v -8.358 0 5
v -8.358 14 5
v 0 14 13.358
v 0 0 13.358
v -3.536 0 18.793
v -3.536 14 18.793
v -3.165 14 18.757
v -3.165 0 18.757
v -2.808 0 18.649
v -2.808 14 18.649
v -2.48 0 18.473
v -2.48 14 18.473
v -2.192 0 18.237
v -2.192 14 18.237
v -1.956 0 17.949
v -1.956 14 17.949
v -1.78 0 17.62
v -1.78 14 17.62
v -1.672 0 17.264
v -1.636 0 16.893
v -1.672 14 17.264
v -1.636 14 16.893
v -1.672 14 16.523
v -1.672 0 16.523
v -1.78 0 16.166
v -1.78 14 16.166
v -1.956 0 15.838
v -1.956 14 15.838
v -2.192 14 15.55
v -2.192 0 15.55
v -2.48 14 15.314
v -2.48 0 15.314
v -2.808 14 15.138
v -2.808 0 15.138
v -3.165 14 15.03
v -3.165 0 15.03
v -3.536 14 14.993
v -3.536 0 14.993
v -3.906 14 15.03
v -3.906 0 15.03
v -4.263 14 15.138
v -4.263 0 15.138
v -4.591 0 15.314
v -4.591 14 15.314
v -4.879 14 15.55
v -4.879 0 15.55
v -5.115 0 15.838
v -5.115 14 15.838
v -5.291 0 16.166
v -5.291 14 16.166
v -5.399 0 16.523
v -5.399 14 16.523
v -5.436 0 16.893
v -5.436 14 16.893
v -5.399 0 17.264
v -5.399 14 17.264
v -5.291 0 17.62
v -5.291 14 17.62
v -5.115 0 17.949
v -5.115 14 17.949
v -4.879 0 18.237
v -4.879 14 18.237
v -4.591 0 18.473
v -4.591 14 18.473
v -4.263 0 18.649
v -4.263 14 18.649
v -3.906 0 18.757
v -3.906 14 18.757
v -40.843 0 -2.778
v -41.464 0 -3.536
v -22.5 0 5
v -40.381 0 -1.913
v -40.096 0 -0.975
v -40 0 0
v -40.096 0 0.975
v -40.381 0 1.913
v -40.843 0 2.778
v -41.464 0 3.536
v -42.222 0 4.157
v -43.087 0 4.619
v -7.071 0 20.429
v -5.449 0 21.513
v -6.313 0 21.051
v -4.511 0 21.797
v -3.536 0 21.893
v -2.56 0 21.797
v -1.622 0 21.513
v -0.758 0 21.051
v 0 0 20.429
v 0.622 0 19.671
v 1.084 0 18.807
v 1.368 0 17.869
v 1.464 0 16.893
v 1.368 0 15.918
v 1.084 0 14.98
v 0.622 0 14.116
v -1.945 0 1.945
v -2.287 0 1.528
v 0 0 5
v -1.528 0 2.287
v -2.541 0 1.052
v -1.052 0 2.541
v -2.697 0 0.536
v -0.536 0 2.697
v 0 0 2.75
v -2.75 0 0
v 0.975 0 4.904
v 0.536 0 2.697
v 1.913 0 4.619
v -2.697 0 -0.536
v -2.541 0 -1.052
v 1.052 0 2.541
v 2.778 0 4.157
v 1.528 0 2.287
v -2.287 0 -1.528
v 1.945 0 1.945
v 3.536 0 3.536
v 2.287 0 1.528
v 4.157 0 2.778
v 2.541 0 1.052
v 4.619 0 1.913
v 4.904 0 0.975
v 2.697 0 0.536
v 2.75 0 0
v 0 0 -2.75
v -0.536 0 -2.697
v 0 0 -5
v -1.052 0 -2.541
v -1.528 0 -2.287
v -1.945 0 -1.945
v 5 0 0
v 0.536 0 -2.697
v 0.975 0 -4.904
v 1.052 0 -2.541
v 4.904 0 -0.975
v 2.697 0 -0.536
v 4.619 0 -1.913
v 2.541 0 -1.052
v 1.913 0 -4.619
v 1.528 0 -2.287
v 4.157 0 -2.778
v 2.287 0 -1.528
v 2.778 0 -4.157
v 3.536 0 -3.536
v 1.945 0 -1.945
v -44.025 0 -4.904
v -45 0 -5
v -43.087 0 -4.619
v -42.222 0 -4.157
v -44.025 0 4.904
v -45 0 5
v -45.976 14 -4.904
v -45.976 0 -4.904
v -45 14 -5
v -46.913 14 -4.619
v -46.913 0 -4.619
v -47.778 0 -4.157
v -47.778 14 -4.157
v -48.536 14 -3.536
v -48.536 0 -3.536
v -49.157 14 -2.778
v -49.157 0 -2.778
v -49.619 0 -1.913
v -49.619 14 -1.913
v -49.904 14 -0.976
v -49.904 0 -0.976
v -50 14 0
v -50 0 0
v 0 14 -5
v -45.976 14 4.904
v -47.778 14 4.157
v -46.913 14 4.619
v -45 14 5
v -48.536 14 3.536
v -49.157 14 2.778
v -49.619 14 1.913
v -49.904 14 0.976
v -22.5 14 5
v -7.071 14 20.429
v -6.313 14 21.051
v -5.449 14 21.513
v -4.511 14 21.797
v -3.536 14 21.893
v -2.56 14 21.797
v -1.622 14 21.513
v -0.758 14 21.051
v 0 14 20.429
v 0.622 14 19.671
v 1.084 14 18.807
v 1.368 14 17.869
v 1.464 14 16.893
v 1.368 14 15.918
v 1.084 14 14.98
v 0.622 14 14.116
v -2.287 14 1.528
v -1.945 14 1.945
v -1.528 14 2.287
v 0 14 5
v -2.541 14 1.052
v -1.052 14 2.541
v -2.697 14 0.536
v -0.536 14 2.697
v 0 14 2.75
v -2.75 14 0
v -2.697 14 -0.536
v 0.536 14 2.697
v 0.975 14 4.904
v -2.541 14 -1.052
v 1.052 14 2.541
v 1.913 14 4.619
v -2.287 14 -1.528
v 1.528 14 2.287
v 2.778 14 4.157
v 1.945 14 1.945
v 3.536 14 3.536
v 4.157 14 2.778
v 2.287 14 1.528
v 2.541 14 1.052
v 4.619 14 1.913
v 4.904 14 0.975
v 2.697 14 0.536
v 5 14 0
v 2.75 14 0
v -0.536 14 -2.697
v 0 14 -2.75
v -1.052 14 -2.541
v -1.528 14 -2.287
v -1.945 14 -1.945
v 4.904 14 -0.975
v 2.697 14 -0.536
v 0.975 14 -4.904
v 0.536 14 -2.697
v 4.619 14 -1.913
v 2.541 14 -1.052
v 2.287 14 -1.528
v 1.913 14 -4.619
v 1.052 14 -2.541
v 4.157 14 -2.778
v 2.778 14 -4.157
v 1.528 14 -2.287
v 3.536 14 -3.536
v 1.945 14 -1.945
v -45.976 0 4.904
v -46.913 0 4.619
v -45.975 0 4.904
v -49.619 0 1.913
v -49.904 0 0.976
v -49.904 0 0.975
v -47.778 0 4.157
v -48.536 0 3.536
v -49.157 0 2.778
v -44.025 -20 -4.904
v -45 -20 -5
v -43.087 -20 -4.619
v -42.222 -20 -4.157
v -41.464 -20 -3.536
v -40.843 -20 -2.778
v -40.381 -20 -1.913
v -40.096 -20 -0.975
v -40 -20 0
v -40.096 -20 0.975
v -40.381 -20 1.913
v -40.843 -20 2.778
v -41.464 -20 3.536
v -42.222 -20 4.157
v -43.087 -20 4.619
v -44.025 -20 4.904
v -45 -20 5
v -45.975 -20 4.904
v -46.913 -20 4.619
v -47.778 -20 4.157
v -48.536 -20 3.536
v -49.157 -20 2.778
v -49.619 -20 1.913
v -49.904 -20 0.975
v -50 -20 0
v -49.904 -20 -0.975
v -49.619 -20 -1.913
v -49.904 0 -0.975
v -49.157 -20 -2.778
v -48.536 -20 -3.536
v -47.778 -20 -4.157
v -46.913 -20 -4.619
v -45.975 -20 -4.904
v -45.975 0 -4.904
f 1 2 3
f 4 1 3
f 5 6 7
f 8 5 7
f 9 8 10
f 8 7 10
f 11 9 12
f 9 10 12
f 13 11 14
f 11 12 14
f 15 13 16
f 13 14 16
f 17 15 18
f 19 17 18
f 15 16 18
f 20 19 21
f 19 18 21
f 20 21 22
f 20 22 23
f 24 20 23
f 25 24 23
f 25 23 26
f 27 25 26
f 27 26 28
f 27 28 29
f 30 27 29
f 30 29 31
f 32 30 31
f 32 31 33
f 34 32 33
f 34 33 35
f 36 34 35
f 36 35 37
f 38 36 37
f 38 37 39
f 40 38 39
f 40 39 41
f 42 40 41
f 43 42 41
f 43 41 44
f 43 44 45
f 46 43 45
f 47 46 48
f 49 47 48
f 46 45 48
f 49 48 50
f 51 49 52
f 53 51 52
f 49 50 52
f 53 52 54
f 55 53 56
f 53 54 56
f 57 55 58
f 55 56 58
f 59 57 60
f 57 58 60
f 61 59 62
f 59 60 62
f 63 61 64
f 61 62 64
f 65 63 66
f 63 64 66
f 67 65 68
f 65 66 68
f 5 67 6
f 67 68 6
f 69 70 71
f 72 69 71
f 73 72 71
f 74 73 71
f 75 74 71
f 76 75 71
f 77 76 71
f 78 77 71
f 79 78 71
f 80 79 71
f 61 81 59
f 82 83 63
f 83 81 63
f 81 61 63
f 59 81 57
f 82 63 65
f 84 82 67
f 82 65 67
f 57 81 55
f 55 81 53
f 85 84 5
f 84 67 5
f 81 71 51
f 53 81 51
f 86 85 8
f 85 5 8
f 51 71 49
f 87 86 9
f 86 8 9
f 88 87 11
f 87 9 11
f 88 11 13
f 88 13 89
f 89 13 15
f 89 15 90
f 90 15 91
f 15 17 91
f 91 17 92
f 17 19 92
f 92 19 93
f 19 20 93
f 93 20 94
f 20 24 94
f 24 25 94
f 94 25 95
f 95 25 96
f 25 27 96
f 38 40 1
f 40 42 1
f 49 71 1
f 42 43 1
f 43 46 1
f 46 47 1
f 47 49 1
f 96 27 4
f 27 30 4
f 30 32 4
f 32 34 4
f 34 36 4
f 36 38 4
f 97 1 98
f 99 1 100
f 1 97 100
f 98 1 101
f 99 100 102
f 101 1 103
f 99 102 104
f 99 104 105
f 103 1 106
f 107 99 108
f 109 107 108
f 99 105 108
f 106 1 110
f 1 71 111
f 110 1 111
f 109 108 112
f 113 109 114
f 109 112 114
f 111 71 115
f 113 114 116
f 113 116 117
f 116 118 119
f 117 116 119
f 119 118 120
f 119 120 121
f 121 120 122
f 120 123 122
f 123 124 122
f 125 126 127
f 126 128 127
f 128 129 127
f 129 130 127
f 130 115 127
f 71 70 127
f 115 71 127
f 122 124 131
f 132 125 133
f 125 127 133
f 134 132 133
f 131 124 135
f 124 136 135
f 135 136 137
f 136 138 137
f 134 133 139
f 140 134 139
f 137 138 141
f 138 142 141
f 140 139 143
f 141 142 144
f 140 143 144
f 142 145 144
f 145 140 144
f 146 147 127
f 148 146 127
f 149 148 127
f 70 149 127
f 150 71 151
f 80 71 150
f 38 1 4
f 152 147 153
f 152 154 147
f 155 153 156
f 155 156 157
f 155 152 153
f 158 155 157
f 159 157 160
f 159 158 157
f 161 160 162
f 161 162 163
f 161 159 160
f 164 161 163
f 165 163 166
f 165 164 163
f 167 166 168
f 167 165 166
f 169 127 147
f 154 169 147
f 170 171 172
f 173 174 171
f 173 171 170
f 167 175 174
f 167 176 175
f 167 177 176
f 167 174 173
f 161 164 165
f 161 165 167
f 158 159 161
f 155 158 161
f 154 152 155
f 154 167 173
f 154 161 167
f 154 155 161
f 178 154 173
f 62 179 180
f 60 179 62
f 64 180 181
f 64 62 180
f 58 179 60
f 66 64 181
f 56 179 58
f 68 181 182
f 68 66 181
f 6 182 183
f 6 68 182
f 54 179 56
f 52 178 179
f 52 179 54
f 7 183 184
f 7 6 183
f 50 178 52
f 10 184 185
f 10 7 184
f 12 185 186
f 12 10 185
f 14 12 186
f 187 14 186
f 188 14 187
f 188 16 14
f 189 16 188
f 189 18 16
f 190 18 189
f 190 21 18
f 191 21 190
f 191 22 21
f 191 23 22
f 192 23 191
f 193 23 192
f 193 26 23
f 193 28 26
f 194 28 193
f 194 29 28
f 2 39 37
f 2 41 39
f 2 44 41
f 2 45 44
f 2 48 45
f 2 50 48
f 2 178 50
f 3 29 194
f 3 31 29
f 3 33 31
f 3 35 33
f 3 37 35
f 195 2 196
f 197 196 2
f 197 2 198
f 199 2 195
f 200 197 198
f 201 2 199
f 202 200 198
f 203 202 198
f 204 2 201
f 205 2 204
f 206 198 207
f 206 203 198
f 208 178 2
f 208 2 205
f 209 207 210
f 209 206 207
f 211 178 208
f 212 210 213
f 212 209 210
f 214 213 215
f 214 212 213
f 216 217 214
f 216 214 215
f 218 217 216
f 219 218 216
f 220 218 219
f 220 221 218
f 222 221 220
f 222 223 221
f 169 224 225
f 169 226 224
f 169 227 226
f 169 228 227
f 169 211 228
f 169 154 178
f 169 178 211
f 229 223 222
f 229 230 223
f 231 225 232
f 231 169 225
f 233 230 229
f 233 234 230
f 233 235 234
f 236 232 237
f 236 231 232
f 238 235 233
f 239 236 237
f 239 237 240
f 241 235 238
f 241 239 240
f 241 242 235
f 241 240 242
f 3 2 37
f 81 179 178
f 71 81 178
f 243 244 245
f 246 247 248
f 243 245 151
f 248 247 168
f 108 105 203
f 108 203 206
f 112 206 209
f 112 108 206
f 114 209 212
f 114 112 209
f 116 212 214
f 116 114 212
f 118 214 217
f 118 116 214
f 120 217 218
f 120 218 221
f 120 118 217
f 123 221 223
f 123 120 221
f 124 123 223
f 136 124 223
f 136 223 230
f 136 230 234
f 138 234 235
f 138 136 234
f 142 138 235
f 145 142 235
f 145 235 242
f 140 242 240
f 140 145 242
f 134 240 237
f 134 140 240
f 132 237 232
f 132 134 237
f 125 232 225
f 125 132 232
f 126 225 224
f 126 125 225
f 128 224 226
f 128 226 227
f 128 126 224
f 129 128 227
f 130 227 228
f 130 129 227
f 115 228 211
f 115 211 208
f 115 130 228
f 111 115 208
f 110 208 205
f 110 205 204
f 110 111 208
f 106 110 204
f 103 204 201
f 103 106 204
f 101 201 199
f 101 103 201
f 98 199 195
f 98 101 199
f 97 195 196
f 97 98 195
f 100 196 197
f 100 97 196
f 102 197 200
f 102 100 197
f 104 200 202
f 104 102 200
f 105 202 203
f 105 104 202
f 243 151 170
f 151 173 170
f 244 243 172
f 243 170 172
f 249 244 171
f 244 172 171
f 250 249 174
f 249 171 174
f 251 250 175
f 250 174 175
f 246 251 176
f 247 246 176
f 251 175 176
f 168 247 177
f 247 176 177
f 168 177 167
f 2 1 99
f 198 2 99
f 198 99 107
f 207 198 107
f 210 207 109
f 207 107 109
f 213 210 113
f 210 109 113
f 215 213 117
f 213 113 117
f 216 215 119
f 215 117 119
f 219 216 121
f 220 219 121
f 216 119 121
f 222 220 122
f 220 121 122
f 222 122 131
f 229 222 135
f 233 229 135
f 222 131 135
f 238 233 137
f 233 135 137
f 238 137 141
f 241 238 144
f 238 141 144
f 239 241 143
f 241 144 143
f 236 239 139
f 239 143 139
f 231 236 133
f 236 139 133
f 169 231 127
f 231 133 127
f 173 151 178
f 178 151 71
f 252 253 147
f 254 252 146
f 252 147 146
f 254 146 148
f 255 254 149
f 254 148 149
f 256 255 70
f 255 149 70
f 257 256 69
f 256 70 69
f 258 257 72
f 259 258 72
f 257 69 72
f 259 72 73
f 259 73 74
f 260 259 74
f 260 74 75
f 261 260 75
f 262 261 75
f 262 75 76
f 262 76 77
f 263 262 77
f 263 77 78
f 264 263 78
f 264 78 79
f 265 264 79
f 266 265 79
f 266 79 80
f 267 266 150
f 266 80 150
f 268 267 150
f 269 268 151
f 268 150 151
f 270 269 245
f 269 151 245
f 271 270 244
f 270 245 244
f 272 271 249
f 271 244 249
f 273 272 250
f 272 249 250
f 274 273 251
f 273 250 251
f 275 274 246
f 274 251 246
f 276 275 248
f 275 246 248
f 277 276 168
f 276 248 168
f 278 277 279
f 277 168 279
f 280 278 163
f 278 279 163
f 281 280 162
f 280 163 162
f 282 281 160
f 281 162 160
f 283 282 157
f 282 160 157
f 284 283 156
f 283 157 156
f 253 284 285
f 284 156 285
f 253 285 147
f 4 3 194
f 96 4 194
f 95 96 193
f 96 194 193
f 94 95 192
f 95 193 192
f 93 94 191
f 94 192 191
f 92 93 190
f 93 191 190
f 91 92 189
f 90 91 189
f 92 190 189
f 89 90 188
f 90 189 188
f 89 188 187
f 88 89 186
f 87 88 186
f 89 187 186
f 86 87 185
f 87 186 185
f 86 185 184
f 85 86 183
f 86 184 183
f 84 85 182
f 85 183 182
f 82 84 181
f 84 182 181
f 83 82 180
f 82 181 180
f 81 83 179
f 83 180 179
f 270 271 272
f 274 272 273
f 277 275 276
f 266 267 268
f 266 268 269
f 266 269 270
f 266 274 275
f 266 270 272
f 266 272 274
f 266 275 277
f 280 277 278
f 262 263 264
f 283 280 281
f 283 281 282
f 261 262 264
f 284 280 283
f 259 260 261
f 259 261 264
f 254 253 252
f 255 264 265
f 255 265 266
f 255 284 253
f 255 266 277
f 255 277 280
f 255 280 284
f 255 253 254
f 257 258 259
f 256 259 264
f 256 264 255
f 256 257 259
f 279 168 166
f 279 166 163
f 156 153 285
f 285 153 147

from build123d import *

# Parameters (mm, degrees)
SKETCH1_R           = 5
SKETCH1_R_2         = 2.75
BOSS_EXTRUDE1_DEPTH = 14
BOSS_EXTRUDE2_START = -14
BOSS_EXTRUDE2_DEPTH = 14
SKETCH3_R           = 5
BOSS_EXTRUDE3_DEPTH = 20
FILLET2_R           = 5
BOSS_EXTRUDE4_DEPTH = 14
SKETCH5_R           = 1.9
CUT_EXTRUDE1_DEPTH  = 65.306460705


with BuildPart() as part:
    # Sketch1 → Boss-Extrude1 (new body)
    with BuildSketch(Plane(origin=(0, 0, 0), x_dir=(1, 0, 0), z_dir=(0, 1, 0))):
        with Locations(Location((0, 0, 0), (0, 0, 270))):
            Circle(SKETCH1_R)
        with Locations(Location((0, 0, 0), (0, 0, 270))):
            Circle(SKETCH1_R_2, mode=Mode.SUBTRACT)
    extrude(amount=BOSS_EXTRUDE1_DEPTH)

    # Sketch2 → Boss-Extrude2 (add)
    with BuildSketch(Plane(origin=(0, 14, 0), x_dir=(1, 0, 0), z_dir=(0, 1, 0)).offset(BOSS_EXTRUDE2_START)):
        with BuildLine():
            Line((0, 5), (-50, 5))
            Line((-50, 5), (-50, -5))
            Line((-50, -5), (0, -5))
            ThreePointArc((0, -5), (-5, 0), (0, 5))
        make_face()
    extrude(amount=BOSS_EXTRUDE2_DEPTH)

    # Sketch3 → Boss-Extrude3 (add)
    with BuildSketch(Plane.XZ):
        with Locations(Location((-45, 0, 0), (0, 0, 270))):
            Circle(SKETCH3_R)
    extrude(amount=BOSS_EXTRUDE3_DEPTH)

    # Fillet2
    fillet2_edges = [part.edges().sort_by_distance(p)[0] for p in [
        (-50, 7, -5),
        (-50, 7, 5),
    ]]
    fillet(fillet2_edges, radius=FILLET2_R - 0.0001)  # a hair under: the kernel refuses the full size

    # Sketch4 → Boss-Extrude4 (add)
    with BuildSketch(Plane(origin=(0, 14, 0), x_dir=(1, 0, 0), z_dir=(0, 1, 0))):
        with BuildLine():
            Line((-8.357864376, -5), (0, -13.357864376))
            ThreePointArc((0, -13.357864376), (0, -20.428932188), (-7.071067812, -20.428932188))
            Line((-7.071067812, -20.428932188), (-22.5, -5))
            Line((-22.5, -5), (-8.357864376, -5))
        make_face()
    extrude(amount=-BOSS_EXTRUDE4_DEPTH)

    # Sketch5 → Cut-Extrude1 (cut, through all)
    with BuildSketch(Plane(origin=(0, 14, 0), x_dir=(1, 0, 0), z_dir=(0, 1, 0))):
        with Locations(Location((-3.535533906, -16.893398282, 0), (0, 0, 270))):
            Circle(SKETCH5_R)
    extrude(amount=-CUT_EXTRUDE1_DEPTH, mode=Mode.SUBTRACT)


solid = part.part
